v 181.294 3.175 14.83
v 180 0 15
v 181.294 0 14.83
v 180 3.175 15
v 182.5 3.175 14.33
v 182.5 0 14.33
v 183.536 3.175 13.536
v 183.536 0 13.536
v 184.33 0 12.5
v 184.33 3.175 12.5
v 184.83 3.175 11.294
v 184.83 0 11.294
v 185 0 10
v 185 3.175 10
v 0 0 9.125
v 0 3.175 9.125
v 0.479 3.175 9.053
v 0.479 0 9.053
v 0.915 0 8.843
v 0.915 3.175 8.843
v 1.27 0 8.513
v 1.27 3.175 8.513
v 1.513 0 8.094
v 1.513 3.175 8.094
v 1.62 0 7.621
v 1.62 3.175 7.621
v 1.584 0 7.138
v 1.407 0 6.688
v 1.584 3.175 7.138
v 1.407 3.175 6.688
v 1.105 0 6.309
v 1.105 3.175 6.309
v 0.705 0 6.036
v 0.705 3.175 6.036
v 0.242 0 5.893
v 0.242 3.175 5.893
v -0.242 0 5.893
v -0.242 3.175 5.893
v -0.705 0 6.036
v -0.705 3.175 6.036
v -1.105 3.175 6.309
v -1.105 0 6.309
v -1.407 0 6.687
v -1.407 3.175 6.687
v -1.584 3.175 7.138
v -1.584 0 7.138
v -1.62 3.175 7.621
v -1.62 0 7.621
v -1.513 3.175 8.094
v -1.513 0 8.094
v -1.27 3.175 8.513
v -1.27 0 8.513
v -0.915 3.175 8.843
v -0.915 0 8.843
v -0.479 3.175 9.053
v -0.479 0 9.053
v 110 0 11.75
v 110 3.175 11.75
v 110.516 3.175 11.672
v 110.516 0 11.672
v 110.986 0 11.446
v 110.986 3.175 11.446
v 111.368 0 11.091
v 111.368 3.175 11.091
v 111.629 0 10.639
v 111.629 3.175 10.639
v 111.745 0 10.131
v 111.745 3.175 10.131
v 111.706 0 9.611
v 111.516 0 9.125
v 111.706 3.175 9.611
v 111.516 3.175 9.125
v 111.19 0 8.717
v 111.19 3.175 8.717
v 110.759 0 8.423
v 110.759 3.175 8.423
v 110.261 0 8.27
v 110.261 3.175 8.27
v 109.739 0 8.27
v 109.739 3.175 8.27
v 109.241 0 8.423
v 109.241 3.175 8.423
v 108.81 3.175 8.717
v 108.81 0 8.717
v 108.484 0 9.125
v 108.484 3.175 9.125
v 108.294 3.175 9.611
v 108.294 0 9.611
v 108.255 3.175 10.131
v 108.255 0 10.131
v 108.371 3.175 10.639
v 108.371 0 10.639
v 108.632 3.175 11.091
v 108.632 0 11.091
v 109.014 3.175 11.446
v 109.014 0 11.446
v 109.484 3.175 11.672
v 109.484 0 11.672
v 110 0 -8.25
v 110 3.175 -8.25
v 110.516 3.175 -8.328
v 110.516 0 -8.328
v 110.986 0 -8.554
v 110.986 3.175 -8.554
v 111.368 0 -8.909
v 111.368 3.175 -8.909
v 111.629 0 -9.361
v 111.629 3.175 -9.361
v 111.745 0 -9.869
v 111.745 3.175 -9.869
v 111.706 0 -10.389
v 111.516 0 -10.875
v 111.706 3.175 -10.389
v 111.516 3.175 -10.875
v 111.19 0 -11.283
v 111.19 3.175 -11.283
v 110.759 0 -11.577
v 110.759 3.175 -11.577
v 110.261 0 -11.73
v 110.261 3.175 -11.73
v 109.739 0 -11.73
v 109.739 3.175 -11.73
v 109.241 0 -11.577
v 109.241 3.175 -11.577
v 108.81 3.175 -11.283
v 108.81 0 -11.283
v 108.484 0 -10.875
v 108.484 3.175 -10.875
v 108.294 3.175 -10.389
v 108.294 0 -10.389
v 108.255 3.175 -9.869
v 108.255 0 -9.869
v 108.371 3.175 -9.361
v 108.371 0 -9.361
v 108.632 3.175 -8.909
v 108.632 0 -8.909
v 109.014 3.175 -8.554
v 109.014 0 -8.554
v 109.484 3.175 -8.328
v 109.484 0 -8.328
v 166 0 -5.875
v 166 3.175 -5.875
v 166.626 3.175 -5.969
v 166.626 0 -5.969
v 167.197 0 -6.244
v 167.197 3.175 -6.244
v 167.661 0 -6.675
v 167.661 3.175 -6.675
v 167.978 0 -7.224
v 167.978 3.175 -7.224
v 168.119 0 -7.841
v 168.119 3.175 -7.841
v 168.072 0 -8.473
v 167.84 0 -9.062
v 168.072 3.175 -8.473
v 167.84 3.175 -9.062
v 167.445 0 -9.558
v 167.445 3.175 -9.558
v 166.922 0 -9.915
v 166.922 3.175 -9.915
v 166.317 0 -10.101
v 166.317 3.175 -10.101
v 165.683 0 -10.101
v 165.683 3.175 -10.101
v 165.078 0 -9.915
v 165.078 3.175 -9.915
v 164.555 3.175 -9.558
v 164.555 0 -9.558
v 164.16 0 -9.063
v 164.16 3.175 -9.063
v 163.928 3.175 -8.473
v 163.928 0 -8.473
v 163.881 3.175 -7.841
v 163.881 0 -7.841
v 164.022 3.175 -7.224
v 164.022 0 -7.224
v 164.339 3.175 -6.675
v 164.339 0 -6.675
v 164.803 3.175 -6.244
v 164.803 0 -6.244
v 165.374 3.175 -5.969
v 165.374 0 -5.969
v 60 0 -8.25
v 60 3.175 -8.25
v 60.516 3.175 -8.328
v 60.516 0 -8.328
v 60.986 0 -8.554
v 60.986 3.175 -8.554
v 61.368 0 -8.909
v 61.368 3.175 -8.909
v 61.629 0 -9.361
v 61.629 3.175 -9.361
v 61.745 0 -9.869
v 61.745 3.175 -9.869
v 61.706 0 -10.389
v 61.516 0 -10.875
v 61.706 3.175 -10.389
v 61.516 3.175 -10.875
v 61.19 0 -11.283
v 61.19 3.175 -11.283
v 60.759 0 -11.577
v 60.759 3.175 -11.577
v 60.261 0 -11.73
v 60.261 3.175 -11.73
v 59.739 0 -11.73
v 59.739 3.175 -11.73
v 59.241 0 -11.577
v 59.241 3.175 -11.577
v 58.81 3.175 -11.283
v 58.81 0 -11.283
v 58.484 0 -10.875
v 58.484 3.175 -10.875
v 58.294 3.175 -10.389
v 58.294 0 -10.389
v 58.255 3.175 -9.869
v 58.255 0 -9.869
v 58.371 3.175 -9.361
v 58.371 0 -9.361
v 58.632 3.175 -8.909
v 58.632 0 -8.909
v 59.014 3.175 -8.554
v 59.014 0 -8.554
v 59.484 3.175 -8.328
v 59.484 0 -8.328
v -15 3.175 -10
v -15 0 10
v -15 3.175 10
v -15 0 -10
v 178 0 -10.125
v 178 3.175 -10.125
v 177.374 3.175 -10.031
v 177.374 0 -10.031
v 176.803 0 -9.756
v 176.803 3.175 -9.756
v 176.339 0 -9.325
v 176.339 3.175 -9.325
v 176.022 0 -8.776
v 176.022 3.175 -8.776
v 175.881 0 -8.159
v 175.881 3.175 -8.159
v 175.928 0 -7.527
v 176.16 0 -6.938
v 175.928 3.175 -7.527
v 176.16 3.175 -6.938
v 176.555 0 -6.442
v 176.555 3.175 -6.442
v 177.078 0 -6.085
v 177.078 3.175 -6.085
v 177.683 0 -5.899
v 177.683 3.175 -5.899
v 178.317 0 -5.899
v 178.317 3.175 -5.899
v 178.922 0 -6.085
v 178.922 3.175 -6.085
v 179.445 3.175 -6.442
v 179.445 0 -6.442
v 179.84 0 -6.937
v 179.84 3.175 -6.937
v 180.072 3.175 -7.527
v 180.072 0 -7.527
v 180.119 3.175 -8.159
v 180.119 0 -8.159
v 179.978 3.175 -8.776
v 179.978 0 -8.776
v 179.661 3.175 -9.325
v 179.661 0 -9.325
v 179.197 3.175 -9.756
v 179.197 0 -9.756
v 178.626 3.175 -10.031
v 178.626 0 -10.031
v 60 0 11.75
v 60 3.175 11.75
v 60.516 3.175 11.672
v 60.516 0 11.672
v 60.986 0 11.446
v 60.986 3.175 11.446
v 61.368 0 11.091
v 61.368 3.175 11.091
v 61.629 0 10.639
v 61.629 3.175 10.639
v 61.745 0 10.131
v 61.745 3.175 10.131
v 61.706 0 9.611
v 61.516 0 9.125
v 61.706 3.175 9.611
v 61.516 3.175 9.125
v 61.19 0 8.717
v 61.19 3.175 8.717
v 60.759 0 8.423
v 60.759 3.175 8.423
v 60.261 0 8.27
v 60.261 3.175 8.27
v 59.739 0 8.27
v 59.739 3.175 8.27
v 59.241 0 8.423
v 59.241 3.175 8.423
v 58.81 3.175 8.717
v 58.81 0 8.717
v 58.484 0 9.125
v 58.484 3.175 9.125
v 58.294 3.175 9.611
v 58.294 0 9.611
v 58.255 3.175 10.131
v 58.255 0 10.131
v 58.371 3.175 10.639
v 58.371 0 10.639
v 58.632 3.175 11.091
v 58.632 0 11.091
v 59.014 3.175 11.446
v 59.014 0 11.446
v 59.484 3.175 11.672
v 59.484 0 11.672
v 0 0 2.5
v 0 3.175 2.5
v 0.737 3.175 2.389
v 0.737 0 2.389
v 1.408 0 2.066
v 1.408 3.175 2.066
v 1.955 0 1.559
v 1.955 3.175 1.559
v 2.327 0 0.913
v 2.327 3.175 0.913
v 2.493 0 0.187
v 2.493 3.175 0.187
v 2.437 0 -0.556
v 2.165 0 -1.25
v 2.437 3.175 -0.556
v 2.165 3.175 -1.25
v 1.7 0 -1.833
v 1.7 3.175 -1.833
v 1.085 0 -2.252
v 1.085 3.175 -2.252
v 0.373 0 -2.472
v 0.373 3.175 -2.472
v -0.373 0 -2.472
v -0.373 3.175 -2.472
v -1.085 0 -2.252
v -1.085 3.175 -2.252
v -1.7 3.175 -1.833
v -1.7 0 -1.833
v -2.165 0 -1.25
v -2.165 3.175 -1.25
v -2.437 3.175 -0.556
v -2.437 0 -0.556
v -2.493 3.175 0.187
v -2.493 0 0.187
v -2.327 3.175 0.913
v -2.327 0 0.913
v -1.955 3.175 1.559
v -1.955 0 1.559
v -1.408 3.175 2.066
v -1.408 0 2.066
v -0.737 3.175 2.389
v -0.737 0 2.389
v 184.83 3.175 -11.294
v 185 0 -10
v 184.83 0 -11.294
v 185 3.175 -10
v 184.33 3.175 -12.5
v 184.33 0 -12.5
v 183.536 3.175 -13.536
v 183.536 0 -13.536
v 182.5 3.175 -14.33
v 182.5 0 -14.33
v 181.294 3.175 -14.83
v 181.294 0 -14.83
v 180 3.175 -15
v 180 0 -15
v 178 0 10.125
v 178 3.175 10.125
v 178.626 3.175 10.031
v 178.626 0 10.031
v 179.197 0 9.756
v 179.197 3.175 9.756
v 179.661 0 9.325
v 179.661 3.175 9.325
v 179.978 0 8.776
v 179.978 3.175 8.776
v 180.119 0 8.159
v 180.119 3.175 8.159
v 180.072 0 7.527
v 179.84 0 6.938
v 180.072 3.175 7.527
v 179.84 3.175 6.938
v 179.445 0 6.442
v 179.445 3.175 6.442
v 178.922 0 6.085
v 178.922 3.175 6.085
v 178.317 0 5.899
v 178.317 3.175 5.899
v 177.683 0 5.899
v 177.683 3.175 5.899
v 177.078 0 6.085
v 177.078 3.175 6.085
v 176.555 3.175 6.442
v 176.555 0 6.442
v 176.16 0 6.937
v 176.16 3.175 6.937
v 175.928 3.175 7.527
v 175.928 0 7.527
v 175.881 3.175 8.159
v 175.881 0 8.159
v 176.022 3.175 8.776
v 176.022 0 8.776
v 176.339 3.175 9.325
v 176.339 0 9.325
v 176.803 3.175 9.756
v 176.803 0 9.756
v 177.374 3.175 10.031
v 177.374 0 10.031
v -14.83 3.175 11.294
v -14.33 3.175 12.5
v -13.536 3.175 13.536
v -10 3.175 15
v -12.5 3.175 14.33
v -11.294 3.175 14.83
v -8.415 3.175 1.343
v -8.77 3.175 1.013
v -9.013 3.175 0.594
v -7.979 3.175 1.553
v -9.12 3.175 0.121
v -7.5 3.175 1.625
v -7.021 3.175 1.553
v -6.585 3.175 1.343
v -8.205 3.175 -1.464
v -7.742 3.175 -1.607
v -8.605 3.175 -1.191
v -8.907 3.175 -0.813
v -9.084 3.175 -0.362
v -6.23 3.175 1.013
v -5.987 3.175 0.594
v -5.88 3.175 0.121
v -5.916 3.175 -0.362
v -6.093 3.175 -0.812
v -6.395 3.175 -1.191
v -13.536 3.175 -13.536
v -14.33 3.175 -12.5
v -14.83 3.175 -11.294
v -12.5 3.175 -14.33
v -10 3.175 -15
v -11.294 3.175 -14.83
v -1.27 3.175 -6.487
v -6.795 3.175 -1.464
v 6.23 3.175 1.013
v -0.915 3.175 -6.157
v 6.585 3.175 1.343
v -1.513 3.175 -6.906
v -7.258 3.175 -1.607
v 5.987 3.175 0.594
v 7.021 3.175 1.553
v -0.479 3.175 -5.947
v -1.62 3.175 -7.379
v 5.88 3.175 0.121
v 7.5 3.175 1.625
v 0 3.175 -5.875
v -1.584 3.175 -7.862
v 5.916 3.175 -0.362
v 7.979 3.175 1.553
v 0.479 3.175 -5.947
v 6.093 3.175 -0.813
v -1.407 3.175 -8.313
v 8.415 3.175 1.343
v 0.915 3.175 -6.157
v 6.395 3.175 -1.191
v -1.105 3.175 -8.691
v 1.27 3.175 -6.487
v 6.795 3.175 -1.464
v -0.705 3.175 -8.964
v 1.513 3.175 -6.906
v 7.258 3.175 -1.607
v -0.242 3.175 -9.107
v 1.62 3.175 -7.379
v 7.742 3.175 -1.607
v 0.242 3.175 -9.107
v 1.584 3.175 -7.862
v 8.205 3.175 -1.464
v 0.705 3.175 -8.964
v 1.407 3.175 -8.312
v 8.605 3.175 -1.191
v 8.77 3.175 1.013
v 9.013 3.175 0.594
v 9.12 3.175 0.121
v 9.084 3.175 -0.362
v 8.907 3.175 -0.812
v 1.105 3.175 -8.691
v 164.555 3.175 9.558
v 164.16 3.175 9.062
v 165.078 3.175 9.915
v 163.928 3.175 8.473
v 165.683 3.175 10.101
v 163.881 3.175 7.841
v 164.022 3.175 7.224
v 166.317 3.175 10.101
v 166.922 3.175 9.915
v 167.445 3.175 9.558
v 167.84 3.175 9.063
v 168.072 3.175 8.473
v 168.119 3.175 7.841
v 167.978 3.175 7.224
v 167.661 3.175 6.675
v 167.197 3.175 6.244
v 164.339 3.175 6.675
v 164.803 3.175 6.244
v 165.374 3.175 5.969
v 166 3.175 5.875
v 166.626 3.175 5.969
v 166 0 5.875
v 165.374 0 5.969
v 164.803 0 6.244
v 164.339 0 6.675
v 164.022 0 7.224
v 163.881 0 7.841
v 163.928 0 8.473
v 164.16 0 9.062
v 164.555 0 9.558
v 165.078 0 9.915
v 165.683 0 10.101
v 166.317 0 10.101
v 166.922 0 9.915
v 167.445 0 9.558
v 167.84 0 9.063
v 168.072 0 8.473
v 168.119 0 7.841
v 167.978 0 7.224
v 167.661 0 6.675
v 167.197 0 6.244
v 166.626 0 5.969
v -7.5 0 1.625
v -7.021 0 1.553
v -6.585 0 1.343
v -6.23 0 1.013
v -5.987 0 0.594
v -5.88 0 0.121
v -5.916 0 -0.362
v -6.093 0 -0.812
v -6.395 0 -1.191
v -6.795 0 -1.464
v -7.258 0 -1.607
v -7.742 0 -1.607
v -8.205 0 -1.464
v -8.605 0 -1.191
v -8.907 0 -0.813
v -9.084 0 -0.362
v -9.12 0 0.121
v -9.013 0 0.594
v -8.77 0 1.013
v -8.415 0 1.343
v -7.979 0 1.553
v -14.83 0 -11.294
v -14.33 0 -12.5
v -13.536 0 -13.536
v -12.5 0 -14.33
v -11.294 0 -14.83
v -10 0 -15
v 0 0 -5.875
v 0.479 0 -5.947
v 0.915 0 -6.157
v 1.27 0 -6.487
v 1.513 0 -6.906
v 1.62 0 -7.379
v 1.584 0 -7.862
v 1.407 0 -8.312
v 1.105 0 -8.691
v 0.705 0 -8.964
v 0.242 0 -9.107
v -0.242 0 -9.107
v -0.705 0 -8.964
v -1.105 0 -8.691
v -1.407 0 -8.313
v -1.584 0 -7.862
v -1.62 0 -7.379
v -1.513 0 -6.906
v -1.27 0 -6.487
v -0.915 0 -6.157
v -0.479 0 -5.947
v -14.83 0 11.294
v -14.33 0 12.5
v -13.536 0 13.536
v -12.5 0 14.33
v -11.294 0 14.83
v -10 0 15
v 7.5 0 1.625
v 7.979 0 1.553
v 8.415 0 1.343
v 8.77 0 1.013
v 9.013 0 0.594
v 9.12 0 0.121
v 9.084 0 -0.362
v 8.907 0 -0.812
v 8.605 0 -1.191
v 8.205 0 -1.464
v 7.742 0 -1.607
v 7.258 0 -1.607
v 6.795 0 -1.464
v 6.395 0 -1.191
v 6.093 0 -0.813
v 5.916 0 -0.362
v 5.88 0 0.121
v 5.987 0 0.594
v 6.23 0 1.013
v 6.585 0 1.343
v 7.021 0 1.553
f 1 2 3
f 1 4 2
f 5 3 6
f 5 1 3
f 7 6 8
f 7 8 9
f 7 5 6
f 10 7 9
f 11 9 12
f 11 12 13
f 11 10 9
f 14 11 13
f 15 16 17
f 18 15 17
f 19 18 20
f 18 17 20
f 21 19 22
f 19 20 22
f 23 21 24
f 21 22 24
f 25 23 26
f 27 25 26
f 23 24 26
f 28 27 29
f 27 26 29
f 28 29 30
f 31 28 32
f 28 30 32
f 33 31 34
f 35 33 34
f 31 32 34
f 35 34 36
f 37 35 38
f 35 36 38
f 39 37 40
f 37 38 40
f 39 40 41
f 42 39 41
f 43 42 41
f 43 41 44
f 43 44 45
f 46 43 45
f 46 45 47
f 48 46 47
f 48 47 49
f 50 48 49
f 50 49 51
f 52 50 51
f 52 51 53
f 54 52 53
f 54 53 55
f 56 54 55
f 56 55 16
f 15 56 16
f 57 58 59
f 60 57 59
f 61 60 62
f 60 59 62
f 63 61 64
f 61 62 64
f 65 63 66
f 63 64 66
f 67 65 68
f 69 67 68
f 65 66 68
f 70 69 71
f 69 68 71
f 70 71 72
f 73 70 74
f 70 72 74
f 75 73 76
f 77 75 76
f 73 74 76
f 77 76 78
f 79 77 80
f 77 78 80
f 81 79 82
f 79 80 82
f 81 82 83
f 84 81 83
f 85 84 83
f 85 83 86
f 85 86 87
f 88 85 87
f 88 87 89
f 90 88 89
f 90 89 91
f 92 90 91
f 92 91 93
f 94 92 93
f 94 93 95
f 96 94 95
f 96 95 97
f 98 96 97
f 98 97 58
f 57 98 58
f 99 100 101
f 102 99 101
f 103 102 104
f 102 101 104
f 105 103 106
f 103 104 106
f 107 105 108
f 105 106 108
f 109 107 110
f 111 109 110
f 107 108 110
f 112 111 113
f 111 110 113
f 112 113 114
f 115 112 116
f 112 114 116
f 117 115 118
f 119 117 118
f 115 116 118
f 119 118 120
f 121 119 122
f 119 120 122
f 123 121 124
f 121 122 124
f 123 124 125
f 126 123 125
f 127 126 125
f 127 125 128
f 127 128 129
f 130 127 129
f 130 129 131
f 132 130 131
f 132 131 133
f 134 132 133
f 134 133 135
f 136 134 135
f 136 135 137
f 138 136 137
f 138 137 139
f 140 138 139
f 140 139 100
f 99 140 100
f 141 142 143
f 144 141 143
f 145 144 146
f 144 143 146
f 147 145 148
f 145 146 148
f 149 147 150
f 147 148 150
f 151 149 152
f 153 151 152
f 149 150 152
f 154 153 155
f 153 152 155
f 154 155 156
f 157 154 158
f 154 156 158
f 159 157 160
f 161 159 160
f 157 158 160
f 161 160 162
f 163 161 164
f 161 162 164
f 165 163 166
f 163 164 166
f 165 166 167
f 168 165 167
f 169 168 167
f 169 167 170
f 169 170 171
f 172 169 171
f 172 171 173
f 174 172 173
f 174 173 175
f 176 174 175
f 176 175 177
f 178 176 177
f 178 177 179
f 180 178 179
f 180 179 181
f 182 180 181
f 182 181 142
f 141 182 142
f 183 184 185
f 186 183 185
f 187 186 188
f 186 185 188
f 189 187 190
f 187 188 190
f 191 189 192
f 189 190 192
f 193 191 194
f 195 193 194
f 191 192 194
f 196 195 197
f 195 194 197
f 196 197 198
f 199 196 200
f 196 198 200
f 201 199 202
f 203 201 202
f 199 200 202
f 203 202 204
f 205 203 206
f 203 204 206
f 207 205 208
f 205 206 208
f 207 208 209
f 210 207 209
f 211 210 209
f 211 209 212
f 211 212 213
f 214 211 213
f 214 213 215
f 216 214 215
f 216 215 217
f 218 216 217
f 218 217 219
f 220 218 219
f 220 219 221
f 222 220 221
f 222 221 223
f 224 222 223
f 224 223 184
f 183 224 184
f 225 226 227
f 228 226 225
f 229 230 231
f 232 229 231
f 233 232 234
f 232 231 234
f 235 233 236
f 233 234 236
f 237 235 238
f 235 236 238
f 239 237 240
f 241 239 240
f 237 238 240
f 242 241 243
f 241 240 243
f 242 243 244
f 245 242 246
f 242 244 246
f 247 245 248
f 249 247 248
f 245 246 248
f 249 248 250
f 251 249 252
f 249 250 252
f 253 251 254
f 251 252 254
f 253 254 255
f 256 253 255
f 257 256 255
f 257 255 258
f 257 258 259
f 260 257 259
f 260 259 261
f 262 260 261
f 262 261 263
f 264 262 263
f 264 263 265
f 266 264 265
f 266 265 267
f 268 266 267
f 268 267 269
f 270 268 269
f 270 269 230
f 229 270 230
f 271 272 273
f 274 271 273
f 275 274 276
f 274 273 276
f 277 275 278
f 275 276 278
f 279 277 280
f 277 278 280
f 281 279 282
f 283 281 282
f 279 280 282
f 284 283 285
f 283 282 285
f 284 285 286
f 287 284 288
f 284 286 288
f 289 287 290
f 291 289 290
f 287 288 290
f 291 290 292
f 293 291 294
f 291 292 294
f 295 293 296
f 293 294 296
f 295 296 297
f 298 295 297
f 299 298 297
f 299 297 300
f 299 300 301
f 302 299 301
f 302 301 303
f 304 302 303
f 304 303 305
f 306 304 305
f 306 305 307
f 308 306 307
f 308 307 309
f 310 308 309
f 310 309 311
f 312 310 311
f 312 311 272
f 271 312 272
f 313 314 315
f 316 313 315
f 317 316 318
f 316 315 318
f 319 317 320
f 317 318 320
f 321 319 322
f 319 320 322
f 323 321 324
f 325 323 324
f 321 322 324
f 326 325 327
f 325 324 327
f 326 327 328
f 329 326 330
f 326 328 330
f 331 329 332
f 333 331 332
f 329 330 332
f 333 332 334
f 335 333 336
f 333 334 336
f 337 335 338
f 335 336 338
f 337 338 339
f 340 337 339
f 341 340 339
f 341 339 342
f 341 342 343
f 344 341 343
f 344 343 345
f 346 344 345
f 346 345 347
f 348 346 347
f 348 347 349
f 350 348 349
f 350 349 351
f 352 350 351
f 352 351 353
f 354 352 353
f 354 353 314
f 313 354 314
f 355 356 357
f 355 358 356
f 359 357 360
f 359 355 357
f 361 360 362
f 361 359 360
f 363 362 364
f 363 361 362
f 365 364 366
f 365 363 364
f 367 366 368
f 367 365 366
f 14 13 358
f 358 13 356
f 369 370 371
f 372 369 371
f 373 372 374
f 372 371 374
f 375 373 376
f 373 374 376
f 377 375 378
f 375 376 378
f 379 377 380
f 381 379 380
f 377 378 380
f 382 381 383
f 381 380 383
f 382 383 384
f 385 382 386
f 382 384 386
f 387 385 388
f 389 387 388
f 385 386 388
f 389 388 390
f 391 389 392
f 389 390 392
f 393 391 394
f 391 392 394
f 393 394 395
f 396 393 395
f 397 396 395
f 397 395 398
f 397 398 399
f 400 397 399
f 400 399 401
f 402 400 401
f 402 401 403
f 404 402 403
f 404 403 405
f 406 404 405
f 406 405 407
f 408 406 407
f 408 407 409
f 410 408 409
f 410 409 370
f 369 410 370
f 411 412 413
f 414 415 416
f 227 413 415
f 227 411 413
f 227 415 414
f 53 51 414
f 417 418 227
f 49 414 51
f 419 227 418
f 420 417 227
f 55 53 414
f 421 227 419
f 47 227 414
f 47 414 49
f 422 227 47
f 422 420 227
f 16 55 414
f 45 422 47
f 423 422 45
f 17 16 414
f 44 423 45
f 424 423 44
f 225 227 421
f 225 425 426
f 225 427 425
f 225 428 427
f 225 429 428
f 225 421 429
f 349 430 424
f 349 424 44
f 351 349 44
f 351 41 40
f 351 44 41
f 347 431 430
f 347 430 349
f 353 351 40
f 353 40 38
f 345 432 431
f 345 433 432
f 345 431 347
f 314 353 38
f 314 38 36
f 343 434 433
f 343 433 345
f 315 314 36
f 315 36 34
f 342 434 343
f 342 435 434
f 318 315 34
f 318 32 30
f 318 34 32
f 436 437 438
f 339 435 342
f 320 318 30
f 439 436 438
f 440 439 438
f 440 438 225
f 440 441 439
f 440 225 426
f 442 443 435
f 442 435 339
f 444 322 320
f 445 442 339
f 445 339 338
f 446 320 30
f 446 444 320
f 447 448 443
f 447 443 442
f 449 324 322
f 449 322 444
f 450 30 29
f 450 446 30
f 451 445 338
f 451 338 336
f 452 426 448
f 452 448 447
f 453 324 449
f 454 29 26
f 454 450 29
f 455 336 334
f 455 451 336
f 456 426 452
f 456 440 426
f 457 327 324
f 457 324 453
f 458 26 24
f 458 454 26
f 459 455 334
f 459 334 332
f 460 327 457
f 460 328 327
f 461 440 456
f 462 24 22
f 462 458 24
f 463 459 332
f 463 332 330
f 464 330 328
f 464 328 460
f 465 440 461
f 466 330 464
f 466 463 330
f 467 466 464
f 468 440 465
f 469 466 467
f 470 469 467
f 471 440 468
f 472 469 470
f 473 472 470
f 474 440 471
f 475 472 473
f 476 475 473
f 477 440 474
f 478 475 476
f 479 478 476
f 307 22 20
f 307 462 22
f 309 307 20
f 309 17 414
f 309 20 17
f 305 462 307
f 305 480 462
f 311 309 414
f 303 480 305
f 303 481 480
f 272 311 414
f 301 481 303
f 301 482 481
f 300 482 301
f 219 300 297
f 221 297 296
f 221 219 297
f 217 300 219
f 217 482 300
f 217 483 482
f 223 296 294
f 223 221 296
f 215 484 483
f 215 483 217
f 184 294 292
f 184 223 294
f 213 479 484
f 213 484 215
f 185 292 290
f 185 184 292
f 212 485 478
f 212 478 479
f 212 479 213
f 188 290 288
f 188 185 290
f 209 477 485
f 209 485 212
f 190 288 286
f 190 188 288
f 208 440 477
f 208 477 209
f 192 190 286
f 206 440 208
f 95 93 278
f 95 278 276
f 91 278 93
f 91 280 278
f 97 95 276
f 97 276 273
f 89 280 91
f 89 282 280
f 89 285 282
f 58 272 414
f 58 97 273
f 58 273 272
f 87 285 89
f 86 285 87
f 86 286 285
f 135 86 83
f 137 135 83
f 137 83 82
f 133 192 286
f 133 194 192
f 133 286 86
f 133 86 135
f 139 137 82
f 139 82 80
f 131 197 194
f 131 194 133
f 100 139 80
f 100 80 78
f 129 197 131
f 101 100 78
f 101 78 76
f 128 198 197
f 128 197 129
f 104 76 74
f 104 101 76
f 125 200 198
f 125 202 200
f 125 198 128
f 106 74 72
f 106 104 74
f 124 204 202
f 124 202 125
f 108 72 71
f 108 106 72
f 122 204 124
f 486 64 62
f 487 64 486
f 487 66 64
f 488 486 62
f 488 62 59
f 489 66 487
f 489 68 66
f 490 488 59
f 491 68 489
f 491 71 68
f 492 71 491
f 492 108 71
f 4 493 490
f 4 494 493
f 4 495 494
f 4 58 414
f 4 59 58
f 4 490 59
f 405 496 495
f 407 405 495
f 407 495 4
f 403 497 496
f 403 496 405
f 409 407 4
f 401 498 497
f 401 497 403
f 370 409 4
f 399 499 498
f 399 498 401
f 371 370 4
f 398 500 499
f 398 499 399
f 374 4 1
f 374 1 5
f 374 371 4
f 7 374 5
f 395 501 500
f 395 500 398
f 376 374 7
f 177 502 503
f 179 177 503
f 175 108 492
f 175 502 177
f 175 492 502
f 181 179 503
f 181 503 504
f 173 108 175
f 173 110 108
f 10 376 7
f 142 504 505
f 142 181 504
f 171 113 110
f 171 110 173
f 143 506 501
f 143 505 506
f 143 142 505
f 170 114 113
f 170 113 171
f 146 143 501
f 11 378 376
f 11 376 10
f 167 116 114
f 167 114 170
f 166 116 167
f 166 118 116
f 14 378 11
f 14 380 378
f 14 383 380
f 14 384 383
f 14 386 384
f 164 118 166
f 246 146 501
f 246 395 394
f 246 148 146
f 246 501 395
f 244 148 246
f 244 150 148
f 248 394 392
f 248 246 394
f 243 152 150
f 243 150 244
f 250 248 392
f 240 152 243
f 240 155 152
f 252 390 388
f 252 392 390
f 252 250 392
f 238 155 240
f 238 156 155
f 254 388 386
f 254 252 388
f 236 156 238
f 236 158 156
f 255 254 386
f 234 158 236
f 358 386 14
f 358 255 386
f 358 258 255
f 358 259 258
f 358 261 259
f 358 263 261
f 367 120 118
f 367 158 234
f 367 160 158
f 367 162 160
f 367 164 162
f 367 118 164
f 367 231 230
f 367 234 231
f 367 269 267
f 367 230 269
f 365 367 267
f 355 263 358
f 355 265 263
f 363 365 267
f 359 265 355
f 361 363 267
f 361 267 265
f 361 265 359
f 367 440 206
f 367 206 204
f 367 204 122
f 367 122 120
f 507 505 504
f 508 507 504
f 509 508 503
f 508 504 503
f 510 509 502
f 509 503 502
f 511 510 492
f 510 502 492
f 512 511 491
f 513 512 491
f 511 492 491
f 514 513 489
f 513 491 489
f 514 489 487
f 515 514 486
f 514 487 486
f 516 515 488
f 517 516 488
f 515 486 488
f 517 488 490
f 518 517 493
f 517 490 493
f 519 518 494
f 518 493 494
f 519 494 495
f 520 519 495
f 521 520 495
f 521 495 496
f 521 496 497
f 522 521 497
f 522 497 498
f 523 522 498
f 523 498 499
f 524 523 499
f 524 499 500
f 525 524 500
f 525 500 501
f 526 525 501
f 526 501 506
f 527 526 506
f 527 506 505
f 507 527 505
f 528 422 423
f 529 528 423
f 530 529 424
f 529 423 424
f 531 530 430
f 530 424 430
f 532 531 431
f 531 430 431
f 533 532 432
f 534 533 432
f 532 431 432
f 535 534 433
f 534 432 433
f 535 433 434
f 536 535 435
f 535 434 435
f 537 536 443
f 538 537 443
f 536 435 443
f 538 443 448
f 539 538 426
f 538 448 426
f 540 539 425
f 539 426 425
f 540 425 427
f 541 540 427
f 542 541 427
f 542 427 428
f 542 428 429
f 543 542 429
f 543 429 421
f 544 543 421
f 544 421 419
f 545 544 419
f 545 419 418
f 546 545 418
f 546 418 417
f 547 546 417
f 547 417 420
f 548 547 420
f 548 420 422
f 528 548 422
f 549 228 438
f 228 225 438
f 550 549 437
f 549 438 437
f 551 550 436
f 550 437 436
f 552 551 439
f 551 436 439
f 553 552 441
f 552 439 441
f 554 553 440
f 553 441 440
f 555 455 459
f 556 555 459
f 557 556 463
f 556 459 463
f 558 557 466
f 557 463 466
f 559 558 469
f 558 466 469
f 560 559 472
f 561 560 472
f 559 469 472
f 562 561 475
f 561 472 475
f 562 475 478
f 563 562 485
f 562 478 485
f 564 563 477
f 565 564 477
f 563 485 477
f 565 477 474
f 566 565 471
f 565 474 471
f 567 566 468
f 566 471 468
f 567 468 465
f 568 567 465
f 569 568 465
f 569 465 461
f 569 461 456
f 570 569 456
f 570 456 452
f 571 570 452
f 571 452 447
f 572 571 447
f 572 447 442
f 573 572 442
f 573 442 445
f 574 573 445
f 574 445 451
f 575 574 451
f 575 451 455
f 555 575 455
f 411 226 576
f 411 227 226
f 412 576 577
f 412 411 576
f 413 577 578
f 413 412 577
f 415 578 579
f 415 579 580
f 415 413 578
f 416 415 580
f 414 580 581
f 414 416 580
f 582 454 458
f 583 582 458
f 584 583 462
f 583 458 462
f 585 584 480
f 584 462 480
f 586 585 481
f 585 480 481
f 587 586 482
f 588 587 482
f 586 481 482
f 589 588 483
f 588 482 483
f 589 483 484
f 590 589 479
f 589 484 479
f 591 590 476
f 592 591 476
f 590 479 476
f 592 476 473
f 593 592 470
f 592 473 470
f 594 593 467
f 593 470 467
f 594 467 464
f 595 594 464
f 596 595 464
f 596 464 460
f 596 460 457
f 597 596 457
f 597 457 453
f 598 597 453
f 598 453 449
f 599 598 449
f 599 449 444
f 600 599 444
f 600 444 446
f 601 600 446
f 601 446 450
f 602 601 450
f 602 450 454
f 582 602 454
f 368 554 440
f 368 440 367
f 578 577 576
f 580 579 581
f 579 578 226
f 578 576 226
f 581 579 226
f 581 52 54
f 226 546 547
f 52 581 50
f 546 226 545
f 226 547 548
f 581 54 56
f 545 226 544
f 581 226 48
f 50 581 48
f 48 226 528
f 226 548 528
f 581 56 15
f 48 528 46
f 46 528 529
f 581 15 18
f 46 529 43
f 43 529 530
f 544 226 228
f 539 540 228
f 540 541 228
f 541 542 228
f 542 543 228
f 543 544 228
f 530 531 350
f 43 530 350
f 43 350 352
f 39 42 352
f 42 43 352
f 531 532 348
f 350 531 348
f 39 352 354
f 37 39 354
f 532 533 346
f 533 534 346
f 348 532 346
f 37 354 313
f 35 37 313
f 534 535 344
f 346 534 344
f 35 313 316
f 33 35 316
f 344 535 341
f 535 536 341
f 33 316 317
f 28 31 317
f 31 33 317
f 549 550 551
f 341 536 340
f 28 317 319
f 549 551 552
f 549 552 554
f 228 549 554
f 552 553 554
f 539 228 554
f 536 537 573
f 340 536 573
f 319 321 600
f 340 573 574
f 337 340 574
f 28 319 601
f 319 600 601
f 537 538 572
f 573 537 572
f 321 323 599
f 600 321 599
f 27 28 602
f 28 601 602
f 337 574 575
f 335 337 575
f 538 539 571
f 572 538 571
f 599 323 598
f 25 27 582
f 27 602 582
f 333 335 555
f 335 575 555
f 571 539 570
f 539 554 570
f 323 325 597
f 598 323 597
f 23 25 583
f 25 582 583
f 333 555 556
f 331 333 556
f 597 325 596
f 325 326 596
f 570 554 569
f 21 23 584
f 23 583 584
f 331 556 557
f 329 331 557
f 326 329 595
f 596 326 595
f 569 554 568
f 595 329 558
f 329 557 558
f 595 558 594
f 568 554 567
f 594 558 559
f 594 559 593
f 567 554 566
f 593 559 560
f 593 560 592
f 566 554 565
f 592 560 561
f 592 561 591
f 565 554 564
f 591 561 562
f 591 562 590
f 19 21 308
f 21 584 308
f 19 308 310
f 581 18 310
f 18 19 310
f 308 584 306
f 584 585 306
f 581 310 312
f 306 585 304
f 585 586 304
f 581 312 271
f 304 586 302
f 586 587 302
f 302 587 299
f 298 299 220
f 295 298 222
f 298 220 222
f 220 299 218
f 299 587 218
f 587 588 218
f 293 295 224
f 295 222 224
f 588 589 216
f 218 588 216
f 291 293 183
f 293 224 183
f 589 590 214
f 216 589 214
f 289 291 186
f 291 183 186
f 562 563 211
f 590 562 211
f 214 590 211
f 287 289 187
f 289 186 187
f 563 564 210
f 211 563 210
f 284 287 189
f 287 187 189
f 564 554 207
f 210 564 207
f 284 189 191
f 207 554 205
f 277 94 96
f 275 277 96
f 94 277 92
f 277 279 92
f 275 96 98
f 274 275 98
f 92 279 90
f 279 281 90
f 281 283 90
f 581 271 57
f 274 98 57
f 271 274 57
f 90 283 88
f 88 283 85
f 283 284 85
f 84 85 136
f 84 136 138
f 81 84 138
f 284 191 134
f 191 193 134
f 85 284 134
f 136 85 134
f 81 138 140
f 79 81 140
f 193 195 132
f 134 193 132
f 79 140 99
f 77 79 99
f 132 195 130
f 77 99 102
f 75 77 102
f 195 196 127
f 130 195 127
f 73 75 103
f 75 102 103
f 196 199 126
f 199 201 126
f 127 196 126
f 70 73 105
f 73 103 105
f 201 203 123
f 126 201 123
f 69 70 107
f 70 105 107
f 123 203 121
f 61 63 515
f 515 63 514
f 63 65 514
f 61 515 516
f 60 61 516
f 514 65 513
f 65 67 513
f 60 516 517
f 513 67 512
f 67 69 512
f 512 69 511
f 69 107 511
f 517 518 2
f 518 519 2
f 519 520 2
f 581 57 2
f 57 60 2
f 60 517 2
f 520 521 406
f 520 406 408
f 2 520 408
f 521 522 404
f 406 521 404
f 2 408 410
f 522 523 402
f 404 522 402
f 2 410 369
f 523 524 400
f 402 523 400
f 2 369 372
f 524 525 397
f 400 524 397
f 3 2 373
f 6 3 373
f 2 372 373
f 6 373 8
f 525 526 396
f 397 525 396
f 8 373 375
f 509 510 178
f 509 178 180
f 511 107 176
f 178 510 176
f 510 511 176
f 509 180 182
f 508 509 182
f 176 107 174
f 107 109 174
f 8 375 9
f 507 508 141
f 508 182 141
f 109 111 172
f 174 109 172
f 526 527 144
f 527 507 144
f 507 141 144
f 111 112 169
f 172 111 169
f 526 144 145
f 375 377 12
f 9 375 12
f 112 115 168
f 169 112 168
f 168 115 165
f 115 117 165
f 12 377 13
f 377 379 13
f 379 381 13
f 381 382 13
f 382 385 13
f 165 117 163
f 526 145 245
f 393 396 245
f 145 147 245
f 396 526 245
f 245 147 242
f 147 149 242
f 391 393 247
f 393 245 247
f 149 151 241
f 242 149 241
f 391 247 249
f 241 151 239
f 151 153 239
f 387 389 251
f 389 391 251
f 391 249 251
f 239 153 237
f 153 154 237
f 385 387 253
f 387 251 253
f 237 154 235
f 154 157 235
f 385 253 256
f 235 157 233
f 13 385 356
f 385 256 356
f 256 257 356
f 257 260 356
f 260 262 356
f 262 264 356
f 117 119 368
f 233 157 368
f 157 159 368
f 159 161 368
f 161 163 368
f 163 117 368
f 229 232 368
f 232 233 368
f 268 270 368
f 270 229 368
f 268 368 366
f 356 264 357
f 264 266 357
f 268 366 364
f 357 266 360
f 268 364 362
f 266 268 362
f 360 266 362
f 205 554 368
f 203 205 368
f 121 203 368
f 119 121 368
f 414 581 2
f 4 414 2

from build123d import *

# Parameters (mm, degrees)
SKETCH1_W           = 200
SKETCH1_H           = 30
BOSS_EXTRUDE1_DEPTH = 3.175
FILLET1_R           = 5
SKETCH2_R           = 2.5
CUT_EXTRUDE1_DEPTH  = 186.634265762
SKETCH3_R           = 1.625
CUT_EXTRUDE3_DEPTH  = 186.634265762
SKETCH4_R           = 1.75
CUT_EXTRUDE4_DEPTH  = 10
SKETCH5_R           = 2.125
CUT_EXTRUDE5_DEPTH  = 186.634265762


with BuildPart() as part:
    # Sketch1 → Boss-Extrude1 (new body)
    with BuildSketch(Plane(origin=(0, 0, 0), x_dir=(1, 0, 0), z_dir=(0, 1, 0))):
        with Locations((85, 0)):
            Rectangle(SKETCH1_W, SKETCH1_H)
    extrude(amount=BOSS_EXTRUDE1_DEPTH)

    # Fillet1
    fillet1_edges = [part.edges().sort_by_distance(p)[0] for p in [
        (-15, 1.5875, -15),
        (185, 1.5875, -15),
        (185, 1.5875, 15),
        (-15, 1.5875, 15),
    ]]
    fillet(fillet1_edges, radius=FILLET1_R)

    # Sketch2 → Cut-Extrude1 (cut, through all)
    with BuildSketch(Plane(origin=(0, 3.175, 0), x_dir=(1, 0, 0), z_dir=(0, 1, 0))):
        with Locations(Location((0, 0, 0), (0, 0, 270))):
            Circle(SKETCH2_R)
    extrude(amount=-CUT_EXTRUDE1_DEPTH, mode=Mode.SUBTRACT)

    # Sketch3 → Cut-Extrude3 (cut, through all)
    with BuildSketch(Plane(origin=(0, 3.175, 0), x_dir=(1, 0, 0), z_dir=(0, 1, 0))):
        with Locations(Location((7.5, 0, 0), (0, 0, 270))):
            Circle(SKETCH3_R)
        with Locations(Location((0, -7.5, 0), (0, 0, 270))):
            Circle(SKETCH3_R)
        with Locations(Location((-7.5, 0, 0), (0, 0, 270))):
            Circle(SKETCH3_R)
        with Locations(Location((0, 7.5, 0), (0, 0, 270))):
            Circle(SKETCH3_R)
    extrude(amount=-CUT_EXTRUDE3_DEPTH, mode=Mode.SUBTRACT)

    # Sketch4 → Cut-Extrude4 (cut)
    with BuildSketch(Plane(origin=(0, 3.175, 0), x_dir=(1, 0, 0), z_dir=(0, 1, 0))):
        with Locations(Location((60, -10, 0), (0, 0, 270))):
            Circle(SKETCH4_R)
        with Locations(Location((110, -10, 0), (0, 0, 270))):
            Circle(SKETCH4_R)
        with Locations(Location((110, 10, 0), (0, 0, 270))):
            Circle(SKETCH4_R)
        with Locations(Location((60, 10, 0), (0, 0, 270))):
            Circle(SKETCH4_R)
    extrude(amount=-CUT_EXTRUDE4_DEPTH, mode=Mode.SUBTRACT)

    # Sketch5 → Cut-Extrude5 (cut, through all)
    with BuildSketch(Plane(origin=(0, 3.175, 0), x_dir=(1, 0, 0), z_dir=(0, 1, 0))):
        with Locations(Location((166, 8, 0), (0, 0, 270))):
            Circle(SKETCH5_R)
        with Locations(Location((178, 8, 0), (0, 0, 90))):
            Circle(SKETCH5_R)
        with Locations(Location((178, -8, 0), (0, 0, 270))):
            Circle(SKETCH5_R)
        with Locations(Location((166, -8, 0), (0, 0, 90))):
            Circle(SKETCH5_R)
    extrude(amount=-CUT_EXTRUDE5_DEPTH, mode=Mode.SUBTRACT)


solid = part.part
